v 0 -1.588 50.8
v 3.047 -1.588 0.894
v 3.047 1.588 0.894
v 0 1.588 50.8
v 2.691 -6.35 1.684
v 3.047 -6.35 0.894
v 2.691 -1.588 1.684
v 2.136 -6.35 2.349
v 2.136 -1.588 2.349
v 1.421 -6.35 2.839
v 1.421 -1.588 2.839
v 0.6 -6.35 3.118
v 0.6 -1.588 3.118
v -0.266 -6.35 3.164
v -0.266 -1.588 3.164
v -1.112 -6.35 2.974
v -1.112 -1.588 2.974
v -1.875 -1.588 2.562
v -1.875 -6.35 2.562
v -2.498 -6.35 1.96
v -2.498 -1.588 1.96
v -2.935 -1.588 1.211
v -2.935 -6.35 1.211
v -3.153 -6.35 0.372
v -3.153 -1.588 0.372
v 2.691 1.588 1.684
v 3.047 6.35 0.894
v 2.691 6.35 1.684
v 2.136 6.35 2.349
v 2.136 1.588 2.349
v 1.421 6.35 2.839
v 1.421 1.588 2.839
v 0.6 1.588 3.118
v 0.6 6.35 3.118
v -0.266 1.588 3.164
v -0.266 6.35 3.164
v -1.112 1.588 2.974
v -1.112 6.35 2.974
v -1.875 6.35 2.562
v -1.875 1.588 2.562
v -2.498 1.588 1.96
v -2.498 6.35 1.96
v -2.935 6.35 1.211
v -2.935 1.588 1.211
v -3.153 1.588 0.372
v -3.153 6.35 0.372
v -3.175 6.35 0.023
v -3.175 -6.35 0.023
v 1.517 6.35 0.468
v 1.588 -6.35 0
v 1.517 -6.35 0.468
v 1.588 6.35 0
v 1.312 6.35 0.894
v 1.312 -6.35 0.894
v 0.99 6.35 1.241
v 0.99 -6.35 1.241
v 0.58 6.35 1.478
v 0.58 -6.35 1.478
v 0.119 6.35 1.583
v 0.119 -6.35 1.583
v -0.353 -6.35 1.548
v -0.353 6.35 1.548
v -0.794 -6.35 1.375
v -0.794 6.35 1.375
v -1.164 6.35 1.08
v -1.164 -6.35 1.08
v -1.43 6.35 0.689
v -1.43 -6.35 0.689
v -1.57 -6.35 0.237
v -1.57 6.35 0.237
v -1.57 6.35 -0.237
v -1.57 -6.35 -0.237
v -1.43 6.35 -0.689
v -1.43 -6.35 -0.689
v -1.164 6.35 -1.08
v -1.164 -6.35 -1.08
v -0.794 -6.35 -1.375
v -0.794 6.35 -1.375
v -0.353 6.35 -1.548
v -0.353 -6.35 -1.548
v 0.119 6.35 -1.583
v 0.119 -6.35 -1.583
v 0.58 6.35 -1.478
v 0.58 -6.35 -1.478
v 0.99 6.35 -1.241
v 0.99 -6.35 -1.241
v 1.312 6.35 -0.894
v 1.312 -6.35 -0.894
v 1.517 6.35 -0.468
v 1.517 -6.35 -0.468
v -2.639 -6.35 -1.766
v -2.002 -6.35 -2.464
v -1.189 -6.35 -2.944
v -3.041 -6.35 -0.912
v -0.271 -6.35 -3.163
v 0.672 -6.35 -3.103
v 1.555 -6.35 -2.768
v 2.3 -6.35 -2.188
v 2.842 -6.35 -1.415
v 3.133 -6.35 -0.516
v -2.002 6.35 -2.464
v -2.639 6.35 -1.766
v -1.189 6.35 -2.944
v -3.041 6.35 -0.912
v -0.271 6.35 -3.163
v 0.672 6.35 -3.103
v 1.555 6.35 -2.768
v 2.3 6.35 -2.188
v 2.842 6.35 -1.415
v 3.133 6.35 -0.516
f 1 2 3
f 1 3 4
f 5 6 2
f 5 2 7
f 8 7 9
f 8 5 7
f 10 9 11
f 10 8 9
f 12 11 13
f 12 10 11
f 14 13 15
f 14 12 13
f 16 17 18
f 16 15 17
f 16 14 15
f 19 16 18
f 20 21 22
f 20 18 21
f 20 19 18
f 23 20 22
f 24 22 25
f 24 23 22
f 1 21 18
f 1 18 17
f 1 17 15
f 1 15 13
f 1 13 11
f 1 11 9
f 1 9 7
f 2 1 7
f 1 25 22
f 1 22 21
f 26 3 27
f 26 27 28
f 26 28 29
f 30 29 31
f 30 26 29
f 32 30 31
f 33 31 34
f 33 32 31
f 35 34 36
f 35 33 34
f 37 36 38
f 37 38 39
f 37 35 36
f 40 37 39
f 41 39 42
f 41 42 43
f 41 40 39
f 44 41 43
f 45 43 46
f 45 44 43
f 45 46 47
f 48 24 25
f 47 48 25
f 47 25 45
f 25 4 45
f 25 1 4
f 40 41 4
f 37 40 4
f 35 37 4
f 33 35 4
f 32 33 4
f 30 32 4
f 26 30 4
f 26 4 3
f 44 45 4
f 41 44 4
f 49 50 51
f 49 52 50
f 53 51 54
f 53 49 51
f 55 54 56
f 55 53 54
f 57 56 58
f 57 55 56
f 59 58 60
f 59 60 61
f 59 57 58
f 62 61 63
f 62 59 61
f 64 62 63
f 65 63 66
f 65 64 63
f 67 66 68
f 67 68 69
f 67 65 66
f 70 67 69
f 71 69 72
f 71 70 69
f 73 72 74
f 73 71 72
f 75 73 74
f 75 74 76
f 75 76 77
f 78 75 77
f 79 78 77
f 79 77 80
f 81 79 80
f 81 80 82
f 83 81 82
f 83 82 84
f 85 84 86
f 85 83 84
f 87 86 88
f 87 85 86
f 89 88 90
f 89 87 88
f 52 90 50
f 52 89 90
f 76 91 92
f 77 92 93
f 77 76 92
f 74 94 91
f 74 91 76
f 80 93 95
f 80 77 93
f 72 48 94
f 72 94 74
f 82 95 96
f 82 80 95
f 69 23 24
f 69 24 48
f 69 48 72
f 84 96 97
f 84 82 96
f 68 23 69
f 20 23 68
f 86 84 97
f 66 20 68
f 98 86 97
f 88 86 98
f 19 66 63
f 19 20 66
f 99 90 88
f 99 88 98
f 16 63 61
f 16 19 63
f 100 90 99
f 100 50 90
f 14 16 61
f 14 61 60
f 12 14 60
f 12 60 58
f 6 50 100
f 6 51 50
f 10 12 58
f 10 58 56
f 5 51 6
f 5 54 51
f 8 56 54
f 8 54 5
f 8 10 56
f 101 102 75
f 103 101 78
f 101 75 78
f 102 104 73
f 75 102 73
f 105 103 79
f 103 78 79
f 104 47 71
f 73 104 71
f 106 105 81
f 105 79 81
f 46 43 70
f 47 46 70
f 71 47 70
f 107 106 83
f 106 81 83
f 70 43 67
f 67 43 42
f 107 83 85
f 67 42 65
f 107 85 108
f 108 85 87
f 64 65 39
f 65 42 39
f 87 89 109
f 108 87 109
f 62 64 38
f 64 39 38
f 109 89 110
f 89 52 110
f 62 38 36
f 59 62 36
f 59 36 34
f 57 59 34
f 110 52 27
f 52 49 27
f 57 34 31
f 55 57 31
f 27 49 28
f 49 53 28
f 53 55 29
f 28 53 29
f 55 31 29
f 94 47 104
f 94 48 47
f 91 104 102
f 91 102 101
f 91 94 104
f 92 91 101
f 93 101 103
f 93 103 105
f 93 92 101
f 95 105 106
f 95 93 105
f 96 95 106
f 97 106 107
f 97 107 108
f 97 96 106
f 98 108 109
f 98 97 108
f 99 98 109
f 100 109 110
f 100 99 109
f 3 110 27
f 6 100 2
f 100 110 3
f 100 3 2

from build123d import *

# Parameters (mm, degrees)
F0_R     = 1.5875
F1_DEPTH = 6.35
F2_DEPTH = 1.5875


with BuildPart() as f1:
    # F0 (on Front) → F1 (new body, symmetric)
    with BuildSketch(Plane.XZ):
        with BuildLine():
            ThreePointArc((-3.1749141346, 0.0233503235), (-0.2706319367, -3.1634448557), (3.1327451143, -0.5162683885))
            Line((3.1327451143, -0.5162683885), (3.0466813259, 0.8935087569))
            ThreePointArc((3.0466813259, 0.8935087569), (-0.2659699045, 3.1638402314), (-3.153094005, 0.3723213606))
            Line((-3.153094005, 0.3723213606), (-3.1749141346, 0.0233503235))
        make_face()
        Circle(F0_R, mode=Mode.SUBTRACT)
    extrude(amount=F1_DEPTH, both=True)

    # F0 (on Front) → F2 (join, symmetric)
    with BuildSketch(Plane.XZ):
        with BuildLine():
            ThreePointArc((-3.153094005, 0.3723213606), (-0.2659699045, 3.1638402314), (3.0466813259, 0.8935087569))
            Line((3.0466813259, 0.8935087569), (0, 50.8))
            Line((0, 50.8), (-3.153094005, 0.3723213606))
        make_face()
    extrude(amount=F2_DEPTH, both=True)


solid = f1.part
